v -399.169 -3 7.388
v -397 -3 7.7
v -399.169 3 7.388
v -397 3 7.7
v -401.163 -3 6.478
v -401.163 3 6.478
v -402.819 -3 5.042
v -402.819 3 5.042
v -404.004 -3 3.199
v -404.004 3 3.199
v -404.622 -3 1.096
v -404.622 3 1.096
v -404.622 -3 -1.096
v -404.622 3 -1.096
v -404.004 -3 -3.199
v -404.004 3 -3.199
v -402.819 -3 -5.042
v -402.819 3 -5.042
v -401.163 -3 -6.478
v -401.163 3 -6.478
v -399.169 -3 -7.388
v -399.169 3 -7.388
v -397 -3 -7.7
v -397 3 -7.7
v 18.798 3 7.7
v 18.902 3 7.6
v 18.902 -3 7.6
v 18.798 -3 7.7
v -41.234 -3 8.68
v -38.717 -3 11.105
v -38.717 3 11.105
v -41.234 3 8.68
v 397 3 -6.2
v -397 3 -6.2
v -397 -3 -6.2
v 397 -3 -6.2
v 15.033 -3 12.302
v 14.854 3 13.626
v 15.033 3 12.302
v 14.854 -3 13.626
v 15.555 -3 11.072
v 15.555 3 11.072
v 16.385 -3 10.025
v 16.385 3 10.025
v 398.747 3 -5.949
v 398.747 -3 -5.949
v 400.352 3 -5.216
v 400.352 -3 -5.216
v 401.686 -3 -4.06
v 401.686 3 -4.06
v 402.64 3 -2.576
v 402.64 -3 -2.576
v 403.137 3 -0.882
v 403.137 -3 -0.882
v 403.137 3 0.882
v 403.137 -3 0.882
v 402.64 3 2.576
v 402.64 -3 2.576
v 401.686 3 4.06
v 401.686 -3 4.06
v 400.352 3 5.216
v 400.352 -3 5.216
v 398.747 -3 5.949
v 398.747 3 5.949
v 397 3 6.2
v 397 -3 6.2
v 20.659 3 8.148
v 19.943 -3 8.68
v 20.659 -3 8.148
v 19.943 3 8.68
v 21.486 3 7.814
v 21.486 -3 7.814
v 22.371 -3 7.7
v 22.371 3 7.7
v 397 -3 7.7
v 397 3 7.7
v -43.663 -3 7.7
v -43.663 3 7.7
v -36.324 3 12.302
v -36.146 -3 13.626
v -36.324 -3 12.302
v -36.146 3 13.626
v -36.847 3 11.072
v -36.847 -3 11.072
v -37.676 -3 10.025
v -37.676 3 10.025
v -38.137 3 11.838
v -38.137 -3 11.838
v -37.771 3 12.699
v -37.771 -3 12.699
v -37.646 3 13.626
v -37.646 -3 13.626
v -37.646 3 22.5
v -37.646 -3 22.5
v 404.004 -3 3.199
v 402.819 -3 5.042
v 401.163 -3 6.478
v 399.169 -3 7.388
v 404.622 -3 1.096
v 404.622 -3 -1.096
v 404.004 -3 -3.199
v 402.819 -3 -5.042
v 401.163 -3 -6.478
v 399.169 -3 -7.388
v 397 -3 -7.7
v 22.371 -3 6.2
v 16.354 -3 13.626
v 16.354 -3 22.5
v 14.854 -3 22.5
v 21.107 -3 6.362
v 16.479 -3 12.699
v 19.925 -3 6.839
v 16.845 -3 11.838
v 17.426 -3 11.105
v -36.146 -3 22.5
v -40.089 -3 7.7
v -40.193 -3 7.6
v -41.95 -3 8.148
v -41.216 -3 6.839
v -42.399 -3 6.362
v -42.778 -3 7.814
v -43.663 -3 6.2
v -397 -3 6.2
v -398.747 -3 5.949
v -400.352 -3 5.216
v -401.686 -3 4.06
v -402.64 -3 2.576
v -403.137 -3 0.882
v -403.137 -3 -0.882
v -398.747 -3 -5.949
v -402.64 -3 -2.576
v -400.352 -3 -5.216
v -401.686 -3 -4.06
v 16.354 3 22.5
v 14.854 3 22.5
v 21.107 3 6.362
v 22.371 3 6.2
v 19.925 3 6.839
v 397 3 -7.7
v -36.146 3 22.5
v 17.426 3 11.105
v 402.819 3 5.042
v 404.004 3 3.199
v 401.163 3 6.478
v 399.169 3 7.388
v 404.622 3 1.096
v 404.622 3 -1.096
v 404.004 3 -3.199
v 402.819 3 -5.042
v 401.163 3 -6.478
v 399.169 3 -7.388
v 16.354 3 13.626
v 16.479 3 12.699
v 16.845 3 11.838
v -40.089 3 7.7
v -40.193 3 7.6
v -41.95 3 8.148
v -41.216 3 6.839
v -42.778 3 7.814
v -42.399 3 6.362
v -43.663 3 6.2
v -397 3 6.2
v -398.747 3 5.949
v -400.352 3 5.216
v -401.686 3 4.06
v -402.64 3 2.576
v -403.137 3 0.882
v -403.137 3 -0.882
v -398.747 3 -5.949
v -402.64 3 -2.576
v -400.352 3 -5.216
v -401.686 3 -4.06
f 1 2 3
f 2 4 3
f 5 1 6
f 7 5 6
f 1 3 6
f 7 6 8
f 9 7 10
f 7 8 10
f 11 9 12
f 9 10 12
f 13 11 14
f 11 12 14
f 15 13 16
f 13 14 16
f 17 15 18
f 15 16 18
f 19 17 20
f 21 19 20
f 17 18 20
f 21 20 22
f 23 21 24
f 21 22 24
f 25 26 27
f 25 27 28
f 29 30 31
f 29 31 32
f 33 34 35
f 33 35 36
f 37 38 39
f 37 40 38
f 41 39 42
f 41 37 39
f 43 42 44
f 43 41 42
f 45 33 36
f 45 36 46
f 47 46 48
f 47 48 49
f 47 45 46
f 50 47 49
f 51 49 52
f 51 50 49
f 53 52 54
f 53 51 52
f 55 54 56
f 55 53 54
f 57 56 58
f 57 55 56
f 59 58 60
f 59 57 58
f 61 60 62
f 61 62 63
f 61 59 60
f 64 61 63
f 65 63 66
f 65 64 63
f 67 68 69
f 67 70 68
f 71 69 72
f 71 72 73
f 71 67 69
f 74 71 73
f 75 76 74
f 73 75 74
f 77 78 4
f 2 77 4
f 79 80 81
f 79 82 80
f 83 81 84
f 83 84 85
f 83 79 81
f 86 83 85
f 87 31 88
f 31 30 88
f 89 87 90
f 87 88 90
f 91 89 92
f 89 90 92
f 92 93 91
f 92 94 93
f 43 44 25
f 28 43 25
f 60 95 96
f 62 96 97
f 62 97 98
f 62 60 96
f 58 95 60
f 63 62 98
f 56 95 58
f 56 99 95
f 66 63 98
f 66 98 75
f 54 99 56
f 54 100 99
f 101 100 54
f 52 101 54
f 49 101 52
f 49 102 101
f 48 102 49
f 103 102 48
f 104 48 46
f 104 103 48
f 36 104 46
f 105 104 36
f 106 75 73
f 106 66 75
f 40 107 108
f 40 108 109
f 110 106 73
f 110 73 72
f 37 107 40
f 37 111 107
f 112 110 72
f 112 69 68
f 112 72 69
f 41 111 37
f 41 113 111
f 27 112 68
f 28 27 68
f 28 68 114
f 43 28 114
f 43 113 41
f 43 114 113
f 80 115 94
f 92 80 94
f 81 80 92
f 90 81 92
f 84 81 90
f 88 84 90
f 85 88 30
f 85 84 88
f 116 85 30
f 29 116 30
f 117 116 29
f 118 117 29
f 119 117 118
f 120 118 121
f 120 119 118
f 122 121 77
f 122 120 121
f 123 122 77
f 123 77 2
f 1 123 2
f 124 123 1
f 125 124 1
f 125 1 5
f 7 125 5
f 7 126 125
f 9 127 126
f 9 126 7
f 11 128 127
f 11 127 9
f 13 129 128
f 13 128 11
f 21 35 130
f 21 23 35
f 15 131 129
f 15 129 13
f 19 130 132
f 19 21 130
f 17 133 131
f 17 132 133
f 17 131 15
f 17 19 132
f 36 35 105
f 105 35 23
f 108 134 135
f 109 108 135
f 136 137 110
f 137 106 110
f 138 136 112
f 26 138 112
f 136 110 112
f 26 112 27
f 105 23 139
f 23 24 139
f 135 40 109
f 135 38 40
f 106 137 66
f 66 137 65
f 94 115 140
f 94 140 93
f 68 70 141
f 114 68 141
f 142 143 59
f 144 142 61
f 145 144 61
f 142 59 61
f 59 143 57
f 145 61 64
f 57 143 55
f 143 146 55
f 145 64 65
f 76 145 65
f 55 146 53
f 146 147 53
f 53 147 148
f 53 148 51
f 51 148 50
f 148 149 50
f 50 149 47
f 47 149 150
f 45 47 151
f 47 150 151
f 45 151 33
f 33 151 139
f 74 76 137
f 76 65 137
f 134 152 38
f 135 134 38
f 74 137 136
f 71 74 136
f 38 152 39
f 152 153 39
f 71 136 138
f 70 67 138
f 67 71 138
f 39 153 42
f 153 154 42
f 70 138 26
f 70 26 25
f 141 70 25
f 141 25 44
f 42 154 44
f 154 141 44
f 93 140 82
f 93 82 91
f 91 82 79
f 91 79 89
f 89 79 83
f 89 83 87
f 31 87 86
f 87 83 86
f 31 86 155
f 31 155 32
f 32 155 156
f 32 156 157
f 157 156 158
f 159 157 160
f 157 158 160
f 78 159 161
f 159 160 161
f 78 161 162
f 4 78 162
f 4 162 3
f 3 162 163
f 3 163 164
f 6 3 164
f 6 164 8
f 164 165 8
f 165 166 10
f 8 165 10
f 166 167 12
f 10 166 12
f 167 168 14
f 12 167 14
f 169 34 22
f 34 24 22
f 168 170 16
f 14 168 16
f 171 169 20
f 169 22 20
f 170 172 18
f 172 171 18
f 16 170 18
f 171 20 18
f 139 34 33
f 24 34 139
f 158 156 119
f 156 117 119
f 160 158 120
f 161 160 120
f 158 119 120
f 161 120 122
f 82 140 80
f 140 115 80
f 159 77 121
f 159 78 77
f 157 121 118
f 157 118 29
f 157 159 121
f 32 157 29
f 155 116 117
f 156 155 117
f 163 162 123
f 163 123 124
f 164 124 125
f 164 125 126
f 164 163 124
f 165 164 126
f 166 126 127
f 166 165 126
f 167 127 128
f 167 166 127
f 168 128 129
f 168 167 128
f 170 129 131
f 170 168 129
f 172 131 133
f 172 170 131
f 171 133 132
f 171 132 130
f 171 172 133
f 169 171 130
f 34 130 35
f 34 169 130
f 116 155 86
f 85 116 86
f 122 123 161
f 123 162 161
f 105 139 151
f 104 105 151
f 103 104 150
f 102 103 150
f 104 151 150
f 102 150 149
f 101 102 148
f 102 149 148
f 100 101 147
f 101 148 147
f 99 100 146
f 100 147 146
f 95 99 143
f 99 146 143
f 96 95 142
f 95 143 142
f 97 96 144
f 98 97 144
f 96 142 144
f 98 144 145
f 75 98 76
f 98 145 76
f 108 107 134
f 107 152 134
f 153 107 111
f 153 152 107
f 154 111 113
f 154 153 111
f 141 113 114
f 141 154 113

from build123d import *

# Parameters (mm, degrees)
BOSS_EXTRUDE1_DEPTH = 3
BOSS_EXTRUDE2_DEPTH = 3
CUT_EXTRUDE1_DEPTH  = 406.369387103
FILLET1_R           = 5
FILLET2_R           = 3.5


with BuildPart() as part:
    # Sketch1 → Boss-Extrude1 (new, symmetric)
    with BuildSketch(Plane(origin=(0, 0, 0), x_dir=(1, 0, 0), z_dir=(0, 1, 0))):
        with BuildLine():
            Line((397, -7.7), (-397, -7.7))
            ThreePointArc((-397, -7.7), (-404.7, 0), (-397, 7.7))
            Line((-397, 7.7), (397, 7.7))
            ThreePointArc((397, 7.7), (404.7, 0), (397, -7.7))
        make_face()
        with BuildLine():
            Line((397, -6.2), (-397, -6.2))
            ThreePointArc((-397, -6.2), (-403.2, 0), (-397, 6.2))
            Line((-397, 6.2), (397, 6.2))
            ThreePointArc((397, 6.2), (403.2, 0), (397, -6.2))
        make_face(mode=Mode.SUBTRACT)
    extrude(amount=BOSS_EXTRUDE1_DEPTH, both=True)

    # Sketch2 → Boss-Extrude2 (add, symmetric)
    with BuildSketch(Plane(origin=(0, 0, 0), x_dir=(1, 0, 0), z_dir=(0, 1, 0))):
        Polygon((-36.145786863, -11.5), (-36.145786863, -14.5), (-36.145786863, -22.5), (-37.645786863, -22.5), (-37.645786863, -12.137653431), (-43.807502688, -6.2), (-41.645786863, -6.2), align=None)
        Polygon((14.854213137, -14.5), (14.854213137, -11.5), (20.354213137, -6.2), (22.515928962, -6.2), (16.354213137, -12.137653431), (16.354213137, -22.5), (14.854213137, -22.5), align=None)
    extrude(amount=BOSS_EXTRUDE2_DEPTH, both=True)

    # Sketch3 → Cut-Extrude1 (cut, through all)
    with BuildSketch(Plane(origin=(0, 3, 0), x_dir=(1, 0, 0), z_dir=(0, 1, 0))):
        Polygon((-40.089183089, -7.7), (-41.645786863, -6.2), (20.354213137, -6.2), (18.797609364, -7.7), align=None)
    extrude(amount=-CUT_EXTRUDE1_DEPTH, mode=Mode.SUBTRACT)

    # Fillet1
    fillet1_edges = [part.edges().sort_by_distance(p)[0] for p in [
        (-36.145786863, 0, 11.5),
        (14.854213137, 0, 11.5),
        (-41.645786863, 0, 6.2),
        (20.354213137, 0, 6.2),
    ]]
    fillet(fillet1_edges, radius=FILLET1_R)

    # Fillet2
    fillet2_edges = [part.edges().sort_by_distance(p)[0] for p in [
        (-42.250898914, 0, 7.7),
        (-37.645786863, 0, 12.137653431),
        (20.959325189, 0, 7.7),
        (16.354213137, 0, 12.137653431),
    ]]
    fillet(fillet2_edges, radius=FILLET2_R)


solid = part.part
